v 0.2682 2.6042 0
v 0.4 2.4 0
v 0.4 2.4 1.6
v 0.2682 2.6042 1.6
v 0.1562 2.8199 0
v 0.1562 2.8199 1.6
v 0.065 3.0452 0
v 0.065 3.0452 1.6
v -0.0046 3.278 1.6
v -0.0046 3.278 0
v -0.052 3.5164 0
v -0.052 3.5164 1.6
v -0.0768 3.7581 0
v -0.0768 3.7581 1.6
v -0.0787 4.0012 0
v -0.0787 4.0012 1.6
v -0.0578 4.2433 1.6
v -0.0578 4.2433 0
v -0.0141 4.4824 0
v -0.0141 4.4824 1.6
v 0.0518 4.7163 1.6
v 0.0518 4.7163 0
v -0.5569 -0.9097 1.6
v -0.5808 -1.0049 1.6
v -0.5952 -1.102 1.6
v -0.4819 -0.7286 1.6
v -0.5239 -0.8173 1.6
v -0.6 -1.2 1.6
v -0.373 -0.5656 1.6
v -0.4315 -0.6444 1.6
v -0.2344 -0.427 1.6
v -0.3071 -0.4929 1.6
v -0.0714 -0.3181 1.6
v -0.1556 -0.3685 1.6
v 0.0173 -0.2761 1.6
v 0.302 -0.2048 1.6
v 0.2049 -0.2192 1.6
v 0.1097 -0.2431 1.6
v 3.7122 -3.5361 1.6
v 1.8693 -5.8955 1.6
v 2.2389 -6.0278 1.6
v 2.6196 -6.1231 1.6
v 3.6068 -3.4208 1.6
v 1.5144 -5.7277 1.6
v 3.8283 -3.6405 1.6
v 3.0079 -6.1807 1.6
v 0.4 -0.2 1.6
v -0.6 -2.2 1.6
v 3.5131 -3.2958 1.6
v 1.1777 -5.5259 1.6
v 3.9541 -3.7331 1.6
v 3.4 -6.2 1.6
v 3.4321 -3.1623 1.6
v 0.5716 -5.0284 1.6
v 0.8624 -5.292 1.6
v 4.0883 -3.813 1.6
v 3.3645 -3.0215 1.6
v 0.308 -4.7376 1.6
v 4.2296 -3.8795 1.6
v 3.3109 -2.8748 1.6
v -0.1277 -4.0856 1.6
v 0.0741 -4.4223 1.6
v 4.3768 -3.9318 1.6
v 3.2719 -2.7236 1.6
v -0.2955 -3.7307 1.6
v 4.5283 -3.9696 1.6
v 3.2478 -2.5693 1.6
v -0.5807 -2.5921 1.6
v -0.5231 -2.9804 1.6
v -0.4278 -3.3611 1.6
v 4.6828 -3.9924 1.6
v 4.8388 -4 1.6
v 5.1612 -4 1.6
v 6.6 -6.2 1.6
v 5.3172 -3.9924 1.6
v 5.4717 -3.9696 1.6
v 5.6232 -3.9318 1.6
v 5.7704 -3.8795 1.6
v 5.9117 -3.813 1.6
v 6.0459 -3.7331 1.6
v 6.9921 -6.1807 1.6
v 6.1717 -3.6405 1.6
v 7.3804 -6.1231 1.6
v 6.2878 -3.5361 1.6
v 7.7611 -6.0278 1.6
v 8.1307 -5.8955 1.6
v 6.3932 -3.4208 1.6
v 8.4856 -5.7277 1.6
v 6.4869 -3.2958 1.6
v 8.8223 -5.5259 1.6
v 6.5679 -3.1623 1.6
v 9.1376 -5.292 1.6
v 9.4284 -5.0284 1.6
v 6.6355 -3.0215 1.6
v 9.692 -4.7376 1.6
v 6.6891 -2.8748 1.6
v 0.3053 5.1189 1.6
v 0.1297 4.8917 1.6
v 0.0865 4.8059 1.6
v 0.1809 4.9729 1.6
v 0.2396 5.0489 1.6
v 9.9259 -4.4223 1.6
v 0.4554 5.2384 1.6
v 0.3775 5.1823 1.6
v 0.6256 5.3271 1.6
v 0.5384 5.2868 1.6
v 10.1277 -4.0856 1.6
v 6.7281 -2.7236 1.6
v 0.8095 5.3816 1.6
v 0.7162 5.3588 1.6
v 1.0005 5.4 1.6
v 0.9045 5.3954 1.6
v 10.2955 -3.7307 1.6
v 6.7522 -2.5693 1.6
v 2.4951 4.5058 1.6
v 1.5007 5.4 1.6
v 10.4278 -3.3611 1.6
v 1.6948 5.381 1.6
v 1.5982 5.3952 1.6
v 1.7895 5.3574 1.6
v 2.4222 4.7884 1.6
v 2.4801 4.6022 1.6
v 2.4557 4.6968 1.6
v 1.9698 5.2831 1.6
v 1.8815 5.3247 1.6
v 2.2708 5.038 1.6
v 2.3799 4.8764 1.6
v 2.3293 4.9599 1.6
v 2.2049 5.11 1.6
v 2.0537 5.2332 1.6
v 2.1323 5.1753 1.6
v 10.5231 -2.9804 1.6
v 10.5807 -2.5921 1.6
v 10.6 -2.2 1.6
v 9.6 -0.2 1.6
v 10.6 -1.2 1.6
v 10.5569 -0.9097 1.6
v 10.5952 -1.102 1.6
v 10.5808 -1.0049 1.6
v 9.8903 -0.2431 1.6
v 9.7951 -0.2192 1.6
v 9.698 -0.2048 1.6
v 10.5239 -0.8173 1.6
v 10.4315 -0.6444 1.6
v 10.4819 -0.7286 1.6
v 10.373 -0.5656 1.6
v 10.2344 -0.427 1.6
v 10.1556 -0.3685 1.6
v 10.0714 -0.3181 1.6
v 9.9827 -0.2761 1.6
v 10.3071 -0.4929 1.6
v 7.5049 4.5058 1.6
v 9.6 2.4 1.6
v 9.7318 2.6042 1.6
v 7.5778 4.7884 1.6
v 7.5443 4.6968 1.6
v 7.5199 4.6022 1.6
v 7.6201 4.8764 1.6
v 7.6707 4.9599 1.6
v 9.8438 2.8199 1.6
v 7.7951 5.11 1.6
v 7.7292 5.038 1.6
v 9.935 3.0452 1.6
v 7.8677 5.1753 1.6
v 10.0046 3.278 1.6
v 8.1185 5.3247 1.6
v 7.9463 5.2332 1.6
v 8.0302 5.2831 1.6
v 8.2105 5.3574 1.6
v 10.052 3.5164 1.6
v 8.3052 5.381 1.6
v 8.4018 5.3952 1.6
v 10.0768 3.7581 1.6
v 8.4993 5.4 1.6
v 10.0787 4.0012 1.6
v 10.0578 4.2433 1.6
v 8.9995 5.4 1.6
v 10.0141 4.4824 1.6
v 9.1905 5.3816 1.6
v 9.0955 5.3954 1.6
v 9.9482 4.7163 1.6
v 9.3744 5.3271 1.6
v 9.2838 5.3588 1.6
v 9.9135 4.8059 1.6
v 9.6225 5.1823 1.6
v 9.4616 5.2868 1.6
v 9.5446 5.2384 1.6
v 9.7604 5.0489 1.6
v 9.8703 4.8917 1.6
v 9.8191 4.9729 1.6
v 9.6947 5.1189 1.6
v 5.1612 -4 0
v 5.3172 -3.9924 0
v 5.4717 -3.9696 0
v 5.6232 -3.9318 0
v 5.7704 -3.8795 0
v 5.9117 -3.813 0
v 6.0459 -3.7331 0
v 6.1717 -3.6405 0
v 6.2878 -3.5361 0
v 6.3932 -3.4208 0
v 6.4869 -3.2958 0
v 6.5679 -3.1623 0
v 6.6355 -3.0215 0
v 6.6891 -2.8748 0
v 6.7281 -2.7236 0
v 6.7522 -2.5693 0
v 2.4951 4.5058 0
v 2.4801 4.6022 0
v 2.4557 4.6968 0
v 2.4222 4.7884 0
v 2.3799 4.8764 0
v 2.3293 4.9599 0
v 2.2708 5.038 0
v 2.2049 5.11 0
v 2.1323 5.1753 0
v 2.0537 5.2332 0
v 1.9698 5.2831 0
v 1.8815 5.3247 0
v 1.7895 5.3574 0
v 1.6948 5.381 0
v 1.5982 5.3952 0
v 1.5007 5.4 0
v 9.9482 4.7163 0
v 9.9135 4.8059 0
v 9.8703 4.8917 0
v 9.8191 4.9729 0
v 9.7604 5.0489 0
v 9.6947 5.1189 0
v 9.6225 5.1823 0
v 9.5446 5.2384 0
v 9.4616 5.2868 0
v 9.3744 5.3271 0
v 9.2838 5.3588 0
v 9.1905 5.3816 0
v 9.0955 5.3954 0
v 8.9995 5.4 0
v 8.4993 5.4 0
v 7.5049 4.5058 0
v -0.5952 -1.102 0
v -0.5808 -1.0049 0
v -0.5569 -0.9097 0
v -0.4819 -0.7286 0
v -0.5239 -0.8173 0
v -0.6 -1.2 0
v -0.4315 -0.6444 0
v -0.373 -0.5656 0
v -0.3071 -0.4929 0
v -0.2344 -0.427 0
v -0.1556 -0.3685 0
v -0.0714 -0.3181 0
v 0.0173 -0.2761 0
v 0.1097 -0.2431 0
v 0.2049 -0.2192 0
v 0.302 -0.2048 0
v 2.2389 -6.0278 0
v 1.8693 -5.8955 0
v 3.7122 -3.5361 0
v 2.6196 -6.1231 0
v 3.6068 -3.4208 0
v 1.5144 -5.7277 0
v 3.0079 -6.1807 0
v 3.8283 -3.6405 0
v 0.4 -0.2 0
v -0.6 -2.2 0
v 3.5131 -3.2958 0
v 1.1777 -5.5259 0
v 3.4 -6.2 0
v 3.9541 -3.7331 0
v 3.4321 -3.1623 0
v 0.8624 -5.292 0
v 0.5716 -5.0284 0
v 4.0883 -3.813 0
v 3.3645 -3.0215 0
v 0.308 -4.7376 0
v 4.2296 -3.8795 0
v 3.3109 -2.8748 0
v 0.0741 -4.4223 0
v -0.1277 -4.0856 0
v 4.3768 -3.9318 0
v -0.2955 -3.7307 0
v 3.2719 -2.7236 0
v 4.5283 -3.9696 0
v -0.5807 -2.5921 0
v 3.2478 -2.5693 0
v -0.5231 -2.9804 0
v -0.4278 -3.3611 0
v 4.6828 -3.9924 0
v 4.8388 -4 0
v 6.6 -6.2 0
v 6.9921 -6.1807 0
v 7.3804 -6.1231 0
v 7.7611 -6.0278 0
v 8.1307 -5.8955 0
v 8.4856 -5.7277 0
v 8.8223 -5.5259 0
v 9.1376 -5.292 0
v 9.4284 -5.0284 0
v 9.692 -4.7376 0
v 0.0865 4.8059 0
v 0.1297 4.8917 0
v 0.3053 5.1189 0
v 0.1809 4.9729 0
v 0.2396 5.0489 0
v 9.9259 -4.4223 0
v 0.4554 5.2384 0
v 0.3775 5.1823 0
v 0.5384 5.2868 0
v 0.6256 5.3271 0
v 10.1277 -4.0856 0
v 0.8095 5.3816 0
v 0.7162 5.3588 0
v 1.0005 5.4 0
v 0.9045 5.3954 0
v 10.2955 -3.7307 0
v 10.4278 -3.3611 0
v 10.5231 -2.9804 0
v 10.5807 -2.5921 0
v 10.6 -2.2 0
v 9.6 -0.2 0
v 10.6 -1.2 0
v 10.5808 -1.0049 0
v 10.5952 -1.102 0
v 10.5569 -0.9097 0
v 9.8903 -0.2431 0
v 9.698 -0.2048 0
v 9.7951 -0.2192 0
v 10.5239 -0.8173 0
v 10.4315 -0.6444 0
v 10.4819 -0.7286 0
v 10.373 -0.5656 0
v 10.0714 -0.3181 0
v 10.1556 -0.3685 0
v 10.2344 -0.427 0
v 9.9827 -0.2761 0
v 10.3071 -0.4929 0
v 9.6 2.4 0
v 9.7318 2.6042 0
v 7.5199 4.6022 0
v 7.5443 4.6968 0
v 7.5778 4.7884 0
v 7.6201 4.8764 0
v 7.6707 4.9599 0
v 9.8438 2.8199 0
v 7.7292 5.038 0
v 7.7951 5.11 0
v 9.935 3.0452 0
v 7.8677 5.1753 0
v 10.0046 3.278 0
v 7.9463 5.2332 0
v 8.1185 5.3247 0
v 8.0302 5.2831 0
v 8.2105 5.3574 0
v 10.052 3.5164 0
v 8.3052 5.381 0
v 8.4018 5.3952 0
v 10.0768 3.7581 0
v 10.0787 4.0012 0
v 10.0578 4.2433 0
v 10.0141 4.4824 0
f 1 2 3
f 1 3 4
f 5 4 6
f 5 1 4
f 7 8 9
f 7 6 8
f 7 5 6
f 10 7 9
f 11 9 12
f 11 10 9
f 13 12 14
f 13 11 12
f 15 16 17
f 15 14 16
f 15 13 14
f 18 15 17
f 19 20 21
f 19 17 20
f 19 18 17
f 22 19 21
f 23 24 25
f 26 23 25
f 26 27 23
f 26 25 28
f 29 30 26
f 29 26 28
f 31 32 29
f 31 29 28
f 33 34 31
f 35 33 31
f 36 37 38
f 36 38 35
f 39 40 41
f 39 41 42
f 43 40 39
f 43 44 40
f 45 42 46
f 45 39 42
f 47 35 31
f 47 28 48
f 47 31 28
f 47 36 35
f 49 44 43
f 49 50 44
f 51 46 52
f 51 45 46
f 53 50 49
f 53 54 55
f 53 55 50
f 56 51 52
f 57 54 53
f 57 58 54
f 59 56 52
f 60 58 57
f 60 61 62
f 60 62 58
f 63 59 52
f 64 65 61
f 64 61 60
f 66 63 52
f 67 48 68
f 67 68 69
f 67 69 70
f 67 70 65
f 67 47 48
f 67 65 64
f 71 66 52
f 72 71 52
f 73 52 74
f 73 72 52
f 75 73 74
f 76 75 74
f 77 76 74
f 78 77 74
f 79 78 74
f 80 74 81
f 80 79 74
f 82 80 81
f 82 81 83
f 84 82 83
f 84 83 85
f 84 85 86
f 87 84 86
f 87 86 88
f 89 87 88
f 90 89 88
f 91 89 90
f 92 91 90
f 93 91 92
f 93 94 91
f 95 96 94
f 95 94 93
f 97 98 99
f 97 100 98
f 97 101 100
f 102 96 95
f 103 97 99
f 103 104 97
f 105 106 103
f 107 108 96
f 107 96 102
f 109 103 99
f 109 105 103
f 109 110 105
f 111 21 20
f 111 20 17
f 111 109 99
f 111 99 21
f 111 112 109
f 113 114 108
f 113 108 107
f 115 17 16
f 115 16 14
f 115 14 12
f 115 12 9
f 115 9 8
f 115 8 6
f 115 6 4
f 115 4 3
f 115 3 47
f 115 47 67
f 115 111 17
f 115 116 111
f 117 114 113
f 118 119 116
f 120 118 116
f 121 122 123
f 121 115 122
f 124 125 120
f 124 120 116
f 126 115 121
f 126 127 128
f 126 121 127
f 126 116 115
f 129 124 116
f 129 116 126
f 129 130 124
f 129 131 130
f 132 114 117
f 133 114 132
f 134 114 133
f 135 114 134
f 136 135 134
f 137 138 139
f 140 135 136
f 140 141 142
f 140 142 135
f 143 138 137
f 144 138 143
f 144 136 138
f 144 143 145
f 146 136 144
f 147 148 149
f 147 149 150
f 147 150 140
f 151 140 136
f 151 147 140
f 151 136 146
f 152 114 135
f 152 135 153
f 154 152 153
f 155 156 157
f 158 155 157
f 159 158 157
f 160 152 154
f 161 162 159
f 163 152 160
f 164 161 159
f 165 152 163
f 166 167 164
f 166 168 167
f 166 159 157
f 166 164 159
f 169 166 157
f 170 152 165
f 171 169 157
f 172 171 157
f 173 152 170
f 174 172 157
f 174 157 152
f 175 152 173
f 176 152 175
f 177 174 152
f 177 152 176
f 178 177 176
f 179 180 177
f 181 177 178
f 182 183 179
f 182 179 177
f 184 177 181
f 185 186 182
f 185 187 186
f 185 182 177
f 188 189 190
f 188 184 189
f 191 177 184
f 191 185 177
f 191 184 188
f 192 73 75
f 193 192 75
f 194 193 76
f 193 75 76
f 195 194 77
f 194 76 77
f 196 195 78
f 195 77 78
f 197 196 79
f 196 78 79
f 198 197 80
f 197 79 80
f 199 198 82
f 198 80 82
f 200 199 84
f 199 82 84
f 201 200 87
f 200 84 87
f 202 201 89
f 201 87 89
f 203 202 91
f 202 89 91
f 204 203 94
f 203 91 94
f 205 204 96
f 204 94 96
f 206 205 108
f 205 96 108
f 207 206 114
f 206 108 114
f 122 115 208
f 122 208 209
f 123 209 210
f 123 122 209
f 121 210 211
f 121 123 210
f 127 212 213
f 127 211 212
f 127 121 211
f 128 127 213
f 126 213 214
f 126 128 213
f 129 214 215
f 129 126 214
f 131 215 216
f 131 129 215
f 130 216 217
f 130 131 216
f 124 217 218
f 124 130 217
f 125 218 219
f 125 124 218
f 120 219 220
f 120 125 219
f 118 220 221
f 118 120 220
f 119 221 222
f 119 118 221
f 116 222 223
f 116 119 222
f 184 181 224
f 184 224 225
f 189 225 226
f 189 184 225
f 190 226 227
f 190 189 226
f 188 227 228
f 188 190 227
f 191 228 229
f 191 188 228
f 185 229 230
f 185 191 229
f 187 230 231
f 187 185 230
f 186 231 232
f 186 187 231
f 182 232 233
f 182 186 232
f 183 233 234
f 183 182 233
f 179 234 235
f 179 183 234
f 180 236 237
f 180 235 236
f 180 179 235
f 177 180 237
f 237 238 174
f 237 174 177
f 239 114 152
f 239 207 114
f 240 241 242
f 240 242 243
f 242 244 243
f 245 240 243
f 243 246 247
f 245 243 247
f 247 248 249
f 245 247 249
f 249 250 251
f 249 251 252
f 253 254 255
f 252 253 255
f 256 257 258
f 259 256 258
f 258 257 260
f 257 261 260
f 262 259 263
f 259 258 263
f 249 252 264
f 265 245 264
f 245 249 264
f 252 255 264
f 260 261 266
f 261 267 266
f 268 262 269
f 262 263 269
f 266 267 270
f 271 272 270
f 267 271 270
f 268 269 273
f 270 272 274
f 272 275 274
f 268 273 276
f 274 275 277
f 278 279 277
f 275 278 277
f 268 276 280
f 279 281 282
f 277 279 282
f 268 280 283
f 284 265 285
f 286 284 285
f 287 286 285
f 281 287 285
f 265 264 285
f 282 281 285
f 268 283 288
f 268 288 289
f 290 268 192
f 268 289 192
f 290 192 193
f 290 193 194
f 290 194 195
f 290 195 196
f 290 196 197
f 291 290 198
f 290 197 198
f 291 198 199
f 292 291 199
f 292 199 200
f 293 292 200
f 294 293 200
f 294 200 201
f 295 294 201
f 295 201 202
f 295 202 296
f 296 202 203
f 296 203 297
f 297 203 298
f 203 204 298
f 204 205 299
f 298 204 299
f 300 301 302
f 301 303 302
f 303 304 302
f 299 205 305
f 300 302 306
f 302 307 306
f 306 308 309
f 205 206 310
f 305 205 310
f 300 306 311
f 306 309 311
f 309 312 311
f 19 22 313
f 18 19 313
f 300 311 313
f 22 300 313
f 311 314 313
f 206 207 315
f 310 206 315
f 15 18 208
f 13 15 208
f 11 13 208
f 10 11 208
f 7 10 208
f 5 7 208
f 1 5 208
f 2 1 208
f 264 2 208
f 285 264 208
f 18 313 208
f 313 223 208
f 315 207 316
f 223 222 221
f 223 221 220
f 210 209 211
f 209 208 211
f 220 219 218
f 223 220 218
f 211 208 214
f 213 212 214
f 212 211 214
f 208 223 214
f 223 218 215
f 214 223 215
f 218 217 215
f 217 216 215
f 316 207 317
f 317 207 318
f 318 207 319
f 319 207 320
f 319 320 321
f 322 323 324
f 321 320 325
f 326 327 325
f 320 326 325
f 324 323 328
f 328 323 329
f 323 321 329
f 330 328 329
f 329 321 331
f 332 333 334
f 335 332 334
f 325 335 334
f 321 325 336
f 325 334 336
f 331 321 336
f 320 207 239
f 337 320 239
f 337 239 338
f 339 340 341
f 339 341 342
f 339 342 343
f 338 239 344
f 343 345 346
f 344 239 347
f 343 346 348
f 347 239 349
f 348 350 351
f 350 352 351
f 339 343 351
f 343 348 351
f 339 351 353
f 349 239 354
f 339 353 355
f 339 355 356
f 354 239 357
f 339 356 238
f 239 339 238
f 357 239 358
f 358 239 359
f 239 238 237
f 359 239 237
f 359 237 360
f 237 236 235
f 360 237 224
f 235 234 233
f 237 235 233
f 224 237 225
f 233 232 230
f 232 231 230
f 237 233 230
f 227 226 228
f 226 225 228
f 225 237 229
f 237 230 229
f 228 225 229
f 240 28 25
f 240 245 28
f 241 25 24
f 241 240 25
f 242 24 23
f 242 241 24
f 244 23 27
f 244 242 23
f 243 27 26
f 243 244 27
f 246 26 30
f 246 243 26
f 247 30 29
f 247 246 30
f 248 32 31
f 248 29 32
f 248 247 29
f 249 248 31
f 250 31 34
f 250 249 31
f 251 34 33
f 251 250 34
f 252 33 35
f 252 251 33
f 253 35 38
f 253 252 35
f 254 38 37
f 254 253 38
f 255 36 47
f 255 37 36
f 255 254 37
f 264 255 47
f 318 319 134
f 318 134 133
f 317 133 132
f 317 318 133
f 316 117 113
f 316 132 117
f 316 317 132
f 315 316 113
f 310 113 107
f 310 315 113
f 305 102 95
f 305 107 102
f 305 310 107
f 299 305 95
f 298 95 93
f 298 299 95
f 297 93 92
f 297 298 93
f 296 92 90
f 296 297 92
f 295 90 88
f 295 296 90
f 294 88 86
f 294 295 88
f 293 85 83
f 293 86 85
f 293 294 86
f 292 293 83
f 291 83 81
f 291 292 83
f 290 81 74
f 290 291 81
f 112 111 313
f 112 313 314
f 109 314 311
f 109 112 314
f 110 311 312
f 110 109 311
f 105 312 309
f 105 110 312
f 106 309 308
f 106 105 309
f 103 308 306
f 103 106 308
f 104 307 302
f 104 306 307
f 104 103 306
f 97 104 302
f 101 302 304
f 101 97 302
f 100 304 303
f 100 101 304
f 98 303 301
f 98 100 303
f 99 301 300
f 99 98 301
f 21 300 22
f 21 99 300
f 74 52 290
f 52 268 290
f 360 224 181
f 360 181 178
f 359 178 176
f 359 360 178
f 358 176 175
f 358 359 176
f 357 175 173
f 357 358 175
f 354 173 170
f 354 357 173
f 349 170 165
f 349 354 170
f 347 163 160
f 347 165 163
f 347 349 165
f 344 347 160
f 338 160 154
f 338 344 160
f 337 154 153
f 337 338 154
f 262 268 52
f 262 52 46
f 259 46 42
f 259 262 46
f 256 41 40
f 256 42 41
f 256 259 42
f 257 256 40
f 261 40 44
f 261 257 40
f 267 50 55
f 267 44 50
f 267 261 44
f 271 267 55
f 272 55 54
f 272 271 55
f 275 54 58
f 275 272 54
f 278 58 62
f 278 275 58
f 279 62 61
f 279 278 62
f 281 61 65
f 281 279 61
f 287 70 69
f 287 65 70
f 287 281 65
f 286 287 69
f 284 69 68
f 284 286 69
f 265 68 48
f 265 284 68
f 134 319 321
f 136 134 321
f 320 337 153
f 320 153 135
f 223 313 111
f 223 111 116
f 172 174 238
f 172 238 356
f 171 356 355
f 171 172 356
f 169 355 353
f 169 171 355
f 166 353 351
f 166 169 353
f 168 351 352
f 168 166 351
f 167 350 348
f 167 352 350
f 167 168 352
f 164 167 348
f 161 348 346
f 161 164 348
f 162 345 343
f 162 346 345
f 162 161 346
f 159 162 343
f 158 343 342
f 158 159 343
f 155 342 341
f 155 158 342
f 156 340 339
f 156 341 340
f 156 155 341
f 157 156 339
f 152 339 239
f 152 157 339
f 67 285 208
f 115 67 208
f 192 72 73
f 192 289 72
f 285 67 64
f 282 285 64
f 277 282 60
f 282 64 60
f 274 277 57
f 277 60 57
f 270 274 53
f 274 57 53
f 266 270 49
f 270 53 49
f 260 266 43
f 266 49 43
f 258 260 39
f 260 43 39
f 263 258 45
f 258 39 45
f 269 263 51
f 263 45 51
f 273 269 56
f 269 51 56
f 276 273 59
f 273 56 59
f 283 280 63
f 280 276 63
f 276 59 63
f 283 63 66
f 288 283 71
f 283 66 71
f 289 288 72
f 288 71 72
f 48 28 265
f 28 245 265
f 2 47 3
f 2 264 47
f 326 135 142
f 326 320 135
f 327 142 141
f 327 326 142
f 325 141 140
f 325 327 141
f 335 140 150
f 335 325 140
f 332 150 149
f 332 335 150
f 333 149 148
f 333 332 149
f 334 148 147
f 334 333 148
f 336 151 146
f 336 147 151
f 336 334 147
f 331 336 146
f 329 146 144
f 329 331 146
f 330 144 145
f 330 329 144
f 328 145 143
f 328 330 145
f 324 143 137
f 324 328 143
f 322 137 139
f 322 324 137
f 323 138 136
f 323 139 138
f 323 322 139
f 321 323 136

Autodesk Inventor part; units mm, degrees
ref_plane "YZ Plane" through (0, 0, 0) normal (1, 0, 0) x (0, 1, 0)
ref_plane "XZ Plane" through (0, 0, 0) normal (0, 1, 0) x (-1, 0, 0)
sketch "clip_sketch" plane through (0, 0, 0) normal (0, 0, 1) x (1, 0, 0)
  line L0 (0.2, -0.2) -> (9.8, -0.2) projected
  line L1 (9.8, -0.2) -> (9.8, 2.4) projected
  line L2 (0.2, 2.4) -> (9.8, 2.4) projected
  line L3 (0.2, -0.2) -> (0.2, 2.4) projected
  line L4 (0.4, -0.2) -> (0.4, 2.4)
  line L5 (9.6, 2.4) -> (9.6, -0.2)
  line L6 (0.4, -0.2) -> (0.4, -0.2)
  line L7 (-0.6, -1.2) -> (-0.6, -2.2)
  line L8 (3.4, -6.2) -> (6.6, -6.2)
  line L9 (10.6, -2.2) -> (10.6, -1.2)
  line L10 (9.6, -0.2) -> (9.6, -0.2)
  line L11 (0.4, 2.4) -> (0.4, 5.4)
  line L12 (0.4, 5.4) -> (9.6, 5.4)
  line L13 (9.6, 5.4) -> (9.6, 2.4)
  line L14 (3.4, -4) -> (2.4, 5.4)
  line L15 (6.6, -4) -> (7.6, 5.4)
  arc A0 (0.4, 5.4) -> (0.4, 2.4) centre (2.5, 3.9) ccw
  arc A1 (9.6, 2.4) -> (9.6, 5.4) centre (7.5, 3.9) ccw
  line L16 (5, 2.4) -> (5, -0.2) construction
  arc A2 (0.4, -0.2) -> (-0.6, -1.2) centre (0.4, -1.2) ccw
  arc A3 (10.6, -1.2) -> (9.6, -0.2) centre (9.6, -1.2) ccw
  arc A4 (-0.6, -2.2) -> (3.4, -6.2) centre (3.4, -2.2) ccw
  arc A5 (6.6, -6.2) -> (10.6, -2.2) centre (6.6, -2.2) ccw
  line L17 (3.4, -4) -> (6.6, -4)
  point P0 (0, 0)
  point P1 (-0.6, -0.2)
  dimension "d31" = 0.2
  dimension "d32" = 0.2
  dimension "d33" = 1
  dimension "d34" = 1
  dimension "d35" = 6
  dimension "d36" = 2
  dimension "d37" = 2
  dimension "d39" = 5
  dimension "d40" = 5
  dimension "d41" = 3
  dimension "d42" = 1
  dimension "d43" = 4
  dimension "d44" = 2.2
  dimension "d45" = 1
ref_plane "Work Plane1" through (0.2, -0.2, 2) normal (0, 0, -1) x (0, 1, 0)
extrude "clip" add sketch "clip_sketch" along normal blind 1.6 contours L4 L2 L14 L0 | L0 L14 L17 L15 A3 L9 A5 L8 A4 L7 A2 | L11 L12 L14 L2 | A0 L11 | L15 L2 L5 L0 | L15 L12 L13 L2 | L13 A1
fillet "teeth" radius 1 4 edges at (2.4, 5.4, 0.8) (7.6, 5.4, 0.8) (0.4, 5.4, 0.8) (9.6, 5.4, 0.8)
fillet "inside" radius 1.6 2 edges at (3.4, -4, 0.8) (6.6, -4, 0.8)
properties part number "fastener_lock" material "ABS Plastic"
